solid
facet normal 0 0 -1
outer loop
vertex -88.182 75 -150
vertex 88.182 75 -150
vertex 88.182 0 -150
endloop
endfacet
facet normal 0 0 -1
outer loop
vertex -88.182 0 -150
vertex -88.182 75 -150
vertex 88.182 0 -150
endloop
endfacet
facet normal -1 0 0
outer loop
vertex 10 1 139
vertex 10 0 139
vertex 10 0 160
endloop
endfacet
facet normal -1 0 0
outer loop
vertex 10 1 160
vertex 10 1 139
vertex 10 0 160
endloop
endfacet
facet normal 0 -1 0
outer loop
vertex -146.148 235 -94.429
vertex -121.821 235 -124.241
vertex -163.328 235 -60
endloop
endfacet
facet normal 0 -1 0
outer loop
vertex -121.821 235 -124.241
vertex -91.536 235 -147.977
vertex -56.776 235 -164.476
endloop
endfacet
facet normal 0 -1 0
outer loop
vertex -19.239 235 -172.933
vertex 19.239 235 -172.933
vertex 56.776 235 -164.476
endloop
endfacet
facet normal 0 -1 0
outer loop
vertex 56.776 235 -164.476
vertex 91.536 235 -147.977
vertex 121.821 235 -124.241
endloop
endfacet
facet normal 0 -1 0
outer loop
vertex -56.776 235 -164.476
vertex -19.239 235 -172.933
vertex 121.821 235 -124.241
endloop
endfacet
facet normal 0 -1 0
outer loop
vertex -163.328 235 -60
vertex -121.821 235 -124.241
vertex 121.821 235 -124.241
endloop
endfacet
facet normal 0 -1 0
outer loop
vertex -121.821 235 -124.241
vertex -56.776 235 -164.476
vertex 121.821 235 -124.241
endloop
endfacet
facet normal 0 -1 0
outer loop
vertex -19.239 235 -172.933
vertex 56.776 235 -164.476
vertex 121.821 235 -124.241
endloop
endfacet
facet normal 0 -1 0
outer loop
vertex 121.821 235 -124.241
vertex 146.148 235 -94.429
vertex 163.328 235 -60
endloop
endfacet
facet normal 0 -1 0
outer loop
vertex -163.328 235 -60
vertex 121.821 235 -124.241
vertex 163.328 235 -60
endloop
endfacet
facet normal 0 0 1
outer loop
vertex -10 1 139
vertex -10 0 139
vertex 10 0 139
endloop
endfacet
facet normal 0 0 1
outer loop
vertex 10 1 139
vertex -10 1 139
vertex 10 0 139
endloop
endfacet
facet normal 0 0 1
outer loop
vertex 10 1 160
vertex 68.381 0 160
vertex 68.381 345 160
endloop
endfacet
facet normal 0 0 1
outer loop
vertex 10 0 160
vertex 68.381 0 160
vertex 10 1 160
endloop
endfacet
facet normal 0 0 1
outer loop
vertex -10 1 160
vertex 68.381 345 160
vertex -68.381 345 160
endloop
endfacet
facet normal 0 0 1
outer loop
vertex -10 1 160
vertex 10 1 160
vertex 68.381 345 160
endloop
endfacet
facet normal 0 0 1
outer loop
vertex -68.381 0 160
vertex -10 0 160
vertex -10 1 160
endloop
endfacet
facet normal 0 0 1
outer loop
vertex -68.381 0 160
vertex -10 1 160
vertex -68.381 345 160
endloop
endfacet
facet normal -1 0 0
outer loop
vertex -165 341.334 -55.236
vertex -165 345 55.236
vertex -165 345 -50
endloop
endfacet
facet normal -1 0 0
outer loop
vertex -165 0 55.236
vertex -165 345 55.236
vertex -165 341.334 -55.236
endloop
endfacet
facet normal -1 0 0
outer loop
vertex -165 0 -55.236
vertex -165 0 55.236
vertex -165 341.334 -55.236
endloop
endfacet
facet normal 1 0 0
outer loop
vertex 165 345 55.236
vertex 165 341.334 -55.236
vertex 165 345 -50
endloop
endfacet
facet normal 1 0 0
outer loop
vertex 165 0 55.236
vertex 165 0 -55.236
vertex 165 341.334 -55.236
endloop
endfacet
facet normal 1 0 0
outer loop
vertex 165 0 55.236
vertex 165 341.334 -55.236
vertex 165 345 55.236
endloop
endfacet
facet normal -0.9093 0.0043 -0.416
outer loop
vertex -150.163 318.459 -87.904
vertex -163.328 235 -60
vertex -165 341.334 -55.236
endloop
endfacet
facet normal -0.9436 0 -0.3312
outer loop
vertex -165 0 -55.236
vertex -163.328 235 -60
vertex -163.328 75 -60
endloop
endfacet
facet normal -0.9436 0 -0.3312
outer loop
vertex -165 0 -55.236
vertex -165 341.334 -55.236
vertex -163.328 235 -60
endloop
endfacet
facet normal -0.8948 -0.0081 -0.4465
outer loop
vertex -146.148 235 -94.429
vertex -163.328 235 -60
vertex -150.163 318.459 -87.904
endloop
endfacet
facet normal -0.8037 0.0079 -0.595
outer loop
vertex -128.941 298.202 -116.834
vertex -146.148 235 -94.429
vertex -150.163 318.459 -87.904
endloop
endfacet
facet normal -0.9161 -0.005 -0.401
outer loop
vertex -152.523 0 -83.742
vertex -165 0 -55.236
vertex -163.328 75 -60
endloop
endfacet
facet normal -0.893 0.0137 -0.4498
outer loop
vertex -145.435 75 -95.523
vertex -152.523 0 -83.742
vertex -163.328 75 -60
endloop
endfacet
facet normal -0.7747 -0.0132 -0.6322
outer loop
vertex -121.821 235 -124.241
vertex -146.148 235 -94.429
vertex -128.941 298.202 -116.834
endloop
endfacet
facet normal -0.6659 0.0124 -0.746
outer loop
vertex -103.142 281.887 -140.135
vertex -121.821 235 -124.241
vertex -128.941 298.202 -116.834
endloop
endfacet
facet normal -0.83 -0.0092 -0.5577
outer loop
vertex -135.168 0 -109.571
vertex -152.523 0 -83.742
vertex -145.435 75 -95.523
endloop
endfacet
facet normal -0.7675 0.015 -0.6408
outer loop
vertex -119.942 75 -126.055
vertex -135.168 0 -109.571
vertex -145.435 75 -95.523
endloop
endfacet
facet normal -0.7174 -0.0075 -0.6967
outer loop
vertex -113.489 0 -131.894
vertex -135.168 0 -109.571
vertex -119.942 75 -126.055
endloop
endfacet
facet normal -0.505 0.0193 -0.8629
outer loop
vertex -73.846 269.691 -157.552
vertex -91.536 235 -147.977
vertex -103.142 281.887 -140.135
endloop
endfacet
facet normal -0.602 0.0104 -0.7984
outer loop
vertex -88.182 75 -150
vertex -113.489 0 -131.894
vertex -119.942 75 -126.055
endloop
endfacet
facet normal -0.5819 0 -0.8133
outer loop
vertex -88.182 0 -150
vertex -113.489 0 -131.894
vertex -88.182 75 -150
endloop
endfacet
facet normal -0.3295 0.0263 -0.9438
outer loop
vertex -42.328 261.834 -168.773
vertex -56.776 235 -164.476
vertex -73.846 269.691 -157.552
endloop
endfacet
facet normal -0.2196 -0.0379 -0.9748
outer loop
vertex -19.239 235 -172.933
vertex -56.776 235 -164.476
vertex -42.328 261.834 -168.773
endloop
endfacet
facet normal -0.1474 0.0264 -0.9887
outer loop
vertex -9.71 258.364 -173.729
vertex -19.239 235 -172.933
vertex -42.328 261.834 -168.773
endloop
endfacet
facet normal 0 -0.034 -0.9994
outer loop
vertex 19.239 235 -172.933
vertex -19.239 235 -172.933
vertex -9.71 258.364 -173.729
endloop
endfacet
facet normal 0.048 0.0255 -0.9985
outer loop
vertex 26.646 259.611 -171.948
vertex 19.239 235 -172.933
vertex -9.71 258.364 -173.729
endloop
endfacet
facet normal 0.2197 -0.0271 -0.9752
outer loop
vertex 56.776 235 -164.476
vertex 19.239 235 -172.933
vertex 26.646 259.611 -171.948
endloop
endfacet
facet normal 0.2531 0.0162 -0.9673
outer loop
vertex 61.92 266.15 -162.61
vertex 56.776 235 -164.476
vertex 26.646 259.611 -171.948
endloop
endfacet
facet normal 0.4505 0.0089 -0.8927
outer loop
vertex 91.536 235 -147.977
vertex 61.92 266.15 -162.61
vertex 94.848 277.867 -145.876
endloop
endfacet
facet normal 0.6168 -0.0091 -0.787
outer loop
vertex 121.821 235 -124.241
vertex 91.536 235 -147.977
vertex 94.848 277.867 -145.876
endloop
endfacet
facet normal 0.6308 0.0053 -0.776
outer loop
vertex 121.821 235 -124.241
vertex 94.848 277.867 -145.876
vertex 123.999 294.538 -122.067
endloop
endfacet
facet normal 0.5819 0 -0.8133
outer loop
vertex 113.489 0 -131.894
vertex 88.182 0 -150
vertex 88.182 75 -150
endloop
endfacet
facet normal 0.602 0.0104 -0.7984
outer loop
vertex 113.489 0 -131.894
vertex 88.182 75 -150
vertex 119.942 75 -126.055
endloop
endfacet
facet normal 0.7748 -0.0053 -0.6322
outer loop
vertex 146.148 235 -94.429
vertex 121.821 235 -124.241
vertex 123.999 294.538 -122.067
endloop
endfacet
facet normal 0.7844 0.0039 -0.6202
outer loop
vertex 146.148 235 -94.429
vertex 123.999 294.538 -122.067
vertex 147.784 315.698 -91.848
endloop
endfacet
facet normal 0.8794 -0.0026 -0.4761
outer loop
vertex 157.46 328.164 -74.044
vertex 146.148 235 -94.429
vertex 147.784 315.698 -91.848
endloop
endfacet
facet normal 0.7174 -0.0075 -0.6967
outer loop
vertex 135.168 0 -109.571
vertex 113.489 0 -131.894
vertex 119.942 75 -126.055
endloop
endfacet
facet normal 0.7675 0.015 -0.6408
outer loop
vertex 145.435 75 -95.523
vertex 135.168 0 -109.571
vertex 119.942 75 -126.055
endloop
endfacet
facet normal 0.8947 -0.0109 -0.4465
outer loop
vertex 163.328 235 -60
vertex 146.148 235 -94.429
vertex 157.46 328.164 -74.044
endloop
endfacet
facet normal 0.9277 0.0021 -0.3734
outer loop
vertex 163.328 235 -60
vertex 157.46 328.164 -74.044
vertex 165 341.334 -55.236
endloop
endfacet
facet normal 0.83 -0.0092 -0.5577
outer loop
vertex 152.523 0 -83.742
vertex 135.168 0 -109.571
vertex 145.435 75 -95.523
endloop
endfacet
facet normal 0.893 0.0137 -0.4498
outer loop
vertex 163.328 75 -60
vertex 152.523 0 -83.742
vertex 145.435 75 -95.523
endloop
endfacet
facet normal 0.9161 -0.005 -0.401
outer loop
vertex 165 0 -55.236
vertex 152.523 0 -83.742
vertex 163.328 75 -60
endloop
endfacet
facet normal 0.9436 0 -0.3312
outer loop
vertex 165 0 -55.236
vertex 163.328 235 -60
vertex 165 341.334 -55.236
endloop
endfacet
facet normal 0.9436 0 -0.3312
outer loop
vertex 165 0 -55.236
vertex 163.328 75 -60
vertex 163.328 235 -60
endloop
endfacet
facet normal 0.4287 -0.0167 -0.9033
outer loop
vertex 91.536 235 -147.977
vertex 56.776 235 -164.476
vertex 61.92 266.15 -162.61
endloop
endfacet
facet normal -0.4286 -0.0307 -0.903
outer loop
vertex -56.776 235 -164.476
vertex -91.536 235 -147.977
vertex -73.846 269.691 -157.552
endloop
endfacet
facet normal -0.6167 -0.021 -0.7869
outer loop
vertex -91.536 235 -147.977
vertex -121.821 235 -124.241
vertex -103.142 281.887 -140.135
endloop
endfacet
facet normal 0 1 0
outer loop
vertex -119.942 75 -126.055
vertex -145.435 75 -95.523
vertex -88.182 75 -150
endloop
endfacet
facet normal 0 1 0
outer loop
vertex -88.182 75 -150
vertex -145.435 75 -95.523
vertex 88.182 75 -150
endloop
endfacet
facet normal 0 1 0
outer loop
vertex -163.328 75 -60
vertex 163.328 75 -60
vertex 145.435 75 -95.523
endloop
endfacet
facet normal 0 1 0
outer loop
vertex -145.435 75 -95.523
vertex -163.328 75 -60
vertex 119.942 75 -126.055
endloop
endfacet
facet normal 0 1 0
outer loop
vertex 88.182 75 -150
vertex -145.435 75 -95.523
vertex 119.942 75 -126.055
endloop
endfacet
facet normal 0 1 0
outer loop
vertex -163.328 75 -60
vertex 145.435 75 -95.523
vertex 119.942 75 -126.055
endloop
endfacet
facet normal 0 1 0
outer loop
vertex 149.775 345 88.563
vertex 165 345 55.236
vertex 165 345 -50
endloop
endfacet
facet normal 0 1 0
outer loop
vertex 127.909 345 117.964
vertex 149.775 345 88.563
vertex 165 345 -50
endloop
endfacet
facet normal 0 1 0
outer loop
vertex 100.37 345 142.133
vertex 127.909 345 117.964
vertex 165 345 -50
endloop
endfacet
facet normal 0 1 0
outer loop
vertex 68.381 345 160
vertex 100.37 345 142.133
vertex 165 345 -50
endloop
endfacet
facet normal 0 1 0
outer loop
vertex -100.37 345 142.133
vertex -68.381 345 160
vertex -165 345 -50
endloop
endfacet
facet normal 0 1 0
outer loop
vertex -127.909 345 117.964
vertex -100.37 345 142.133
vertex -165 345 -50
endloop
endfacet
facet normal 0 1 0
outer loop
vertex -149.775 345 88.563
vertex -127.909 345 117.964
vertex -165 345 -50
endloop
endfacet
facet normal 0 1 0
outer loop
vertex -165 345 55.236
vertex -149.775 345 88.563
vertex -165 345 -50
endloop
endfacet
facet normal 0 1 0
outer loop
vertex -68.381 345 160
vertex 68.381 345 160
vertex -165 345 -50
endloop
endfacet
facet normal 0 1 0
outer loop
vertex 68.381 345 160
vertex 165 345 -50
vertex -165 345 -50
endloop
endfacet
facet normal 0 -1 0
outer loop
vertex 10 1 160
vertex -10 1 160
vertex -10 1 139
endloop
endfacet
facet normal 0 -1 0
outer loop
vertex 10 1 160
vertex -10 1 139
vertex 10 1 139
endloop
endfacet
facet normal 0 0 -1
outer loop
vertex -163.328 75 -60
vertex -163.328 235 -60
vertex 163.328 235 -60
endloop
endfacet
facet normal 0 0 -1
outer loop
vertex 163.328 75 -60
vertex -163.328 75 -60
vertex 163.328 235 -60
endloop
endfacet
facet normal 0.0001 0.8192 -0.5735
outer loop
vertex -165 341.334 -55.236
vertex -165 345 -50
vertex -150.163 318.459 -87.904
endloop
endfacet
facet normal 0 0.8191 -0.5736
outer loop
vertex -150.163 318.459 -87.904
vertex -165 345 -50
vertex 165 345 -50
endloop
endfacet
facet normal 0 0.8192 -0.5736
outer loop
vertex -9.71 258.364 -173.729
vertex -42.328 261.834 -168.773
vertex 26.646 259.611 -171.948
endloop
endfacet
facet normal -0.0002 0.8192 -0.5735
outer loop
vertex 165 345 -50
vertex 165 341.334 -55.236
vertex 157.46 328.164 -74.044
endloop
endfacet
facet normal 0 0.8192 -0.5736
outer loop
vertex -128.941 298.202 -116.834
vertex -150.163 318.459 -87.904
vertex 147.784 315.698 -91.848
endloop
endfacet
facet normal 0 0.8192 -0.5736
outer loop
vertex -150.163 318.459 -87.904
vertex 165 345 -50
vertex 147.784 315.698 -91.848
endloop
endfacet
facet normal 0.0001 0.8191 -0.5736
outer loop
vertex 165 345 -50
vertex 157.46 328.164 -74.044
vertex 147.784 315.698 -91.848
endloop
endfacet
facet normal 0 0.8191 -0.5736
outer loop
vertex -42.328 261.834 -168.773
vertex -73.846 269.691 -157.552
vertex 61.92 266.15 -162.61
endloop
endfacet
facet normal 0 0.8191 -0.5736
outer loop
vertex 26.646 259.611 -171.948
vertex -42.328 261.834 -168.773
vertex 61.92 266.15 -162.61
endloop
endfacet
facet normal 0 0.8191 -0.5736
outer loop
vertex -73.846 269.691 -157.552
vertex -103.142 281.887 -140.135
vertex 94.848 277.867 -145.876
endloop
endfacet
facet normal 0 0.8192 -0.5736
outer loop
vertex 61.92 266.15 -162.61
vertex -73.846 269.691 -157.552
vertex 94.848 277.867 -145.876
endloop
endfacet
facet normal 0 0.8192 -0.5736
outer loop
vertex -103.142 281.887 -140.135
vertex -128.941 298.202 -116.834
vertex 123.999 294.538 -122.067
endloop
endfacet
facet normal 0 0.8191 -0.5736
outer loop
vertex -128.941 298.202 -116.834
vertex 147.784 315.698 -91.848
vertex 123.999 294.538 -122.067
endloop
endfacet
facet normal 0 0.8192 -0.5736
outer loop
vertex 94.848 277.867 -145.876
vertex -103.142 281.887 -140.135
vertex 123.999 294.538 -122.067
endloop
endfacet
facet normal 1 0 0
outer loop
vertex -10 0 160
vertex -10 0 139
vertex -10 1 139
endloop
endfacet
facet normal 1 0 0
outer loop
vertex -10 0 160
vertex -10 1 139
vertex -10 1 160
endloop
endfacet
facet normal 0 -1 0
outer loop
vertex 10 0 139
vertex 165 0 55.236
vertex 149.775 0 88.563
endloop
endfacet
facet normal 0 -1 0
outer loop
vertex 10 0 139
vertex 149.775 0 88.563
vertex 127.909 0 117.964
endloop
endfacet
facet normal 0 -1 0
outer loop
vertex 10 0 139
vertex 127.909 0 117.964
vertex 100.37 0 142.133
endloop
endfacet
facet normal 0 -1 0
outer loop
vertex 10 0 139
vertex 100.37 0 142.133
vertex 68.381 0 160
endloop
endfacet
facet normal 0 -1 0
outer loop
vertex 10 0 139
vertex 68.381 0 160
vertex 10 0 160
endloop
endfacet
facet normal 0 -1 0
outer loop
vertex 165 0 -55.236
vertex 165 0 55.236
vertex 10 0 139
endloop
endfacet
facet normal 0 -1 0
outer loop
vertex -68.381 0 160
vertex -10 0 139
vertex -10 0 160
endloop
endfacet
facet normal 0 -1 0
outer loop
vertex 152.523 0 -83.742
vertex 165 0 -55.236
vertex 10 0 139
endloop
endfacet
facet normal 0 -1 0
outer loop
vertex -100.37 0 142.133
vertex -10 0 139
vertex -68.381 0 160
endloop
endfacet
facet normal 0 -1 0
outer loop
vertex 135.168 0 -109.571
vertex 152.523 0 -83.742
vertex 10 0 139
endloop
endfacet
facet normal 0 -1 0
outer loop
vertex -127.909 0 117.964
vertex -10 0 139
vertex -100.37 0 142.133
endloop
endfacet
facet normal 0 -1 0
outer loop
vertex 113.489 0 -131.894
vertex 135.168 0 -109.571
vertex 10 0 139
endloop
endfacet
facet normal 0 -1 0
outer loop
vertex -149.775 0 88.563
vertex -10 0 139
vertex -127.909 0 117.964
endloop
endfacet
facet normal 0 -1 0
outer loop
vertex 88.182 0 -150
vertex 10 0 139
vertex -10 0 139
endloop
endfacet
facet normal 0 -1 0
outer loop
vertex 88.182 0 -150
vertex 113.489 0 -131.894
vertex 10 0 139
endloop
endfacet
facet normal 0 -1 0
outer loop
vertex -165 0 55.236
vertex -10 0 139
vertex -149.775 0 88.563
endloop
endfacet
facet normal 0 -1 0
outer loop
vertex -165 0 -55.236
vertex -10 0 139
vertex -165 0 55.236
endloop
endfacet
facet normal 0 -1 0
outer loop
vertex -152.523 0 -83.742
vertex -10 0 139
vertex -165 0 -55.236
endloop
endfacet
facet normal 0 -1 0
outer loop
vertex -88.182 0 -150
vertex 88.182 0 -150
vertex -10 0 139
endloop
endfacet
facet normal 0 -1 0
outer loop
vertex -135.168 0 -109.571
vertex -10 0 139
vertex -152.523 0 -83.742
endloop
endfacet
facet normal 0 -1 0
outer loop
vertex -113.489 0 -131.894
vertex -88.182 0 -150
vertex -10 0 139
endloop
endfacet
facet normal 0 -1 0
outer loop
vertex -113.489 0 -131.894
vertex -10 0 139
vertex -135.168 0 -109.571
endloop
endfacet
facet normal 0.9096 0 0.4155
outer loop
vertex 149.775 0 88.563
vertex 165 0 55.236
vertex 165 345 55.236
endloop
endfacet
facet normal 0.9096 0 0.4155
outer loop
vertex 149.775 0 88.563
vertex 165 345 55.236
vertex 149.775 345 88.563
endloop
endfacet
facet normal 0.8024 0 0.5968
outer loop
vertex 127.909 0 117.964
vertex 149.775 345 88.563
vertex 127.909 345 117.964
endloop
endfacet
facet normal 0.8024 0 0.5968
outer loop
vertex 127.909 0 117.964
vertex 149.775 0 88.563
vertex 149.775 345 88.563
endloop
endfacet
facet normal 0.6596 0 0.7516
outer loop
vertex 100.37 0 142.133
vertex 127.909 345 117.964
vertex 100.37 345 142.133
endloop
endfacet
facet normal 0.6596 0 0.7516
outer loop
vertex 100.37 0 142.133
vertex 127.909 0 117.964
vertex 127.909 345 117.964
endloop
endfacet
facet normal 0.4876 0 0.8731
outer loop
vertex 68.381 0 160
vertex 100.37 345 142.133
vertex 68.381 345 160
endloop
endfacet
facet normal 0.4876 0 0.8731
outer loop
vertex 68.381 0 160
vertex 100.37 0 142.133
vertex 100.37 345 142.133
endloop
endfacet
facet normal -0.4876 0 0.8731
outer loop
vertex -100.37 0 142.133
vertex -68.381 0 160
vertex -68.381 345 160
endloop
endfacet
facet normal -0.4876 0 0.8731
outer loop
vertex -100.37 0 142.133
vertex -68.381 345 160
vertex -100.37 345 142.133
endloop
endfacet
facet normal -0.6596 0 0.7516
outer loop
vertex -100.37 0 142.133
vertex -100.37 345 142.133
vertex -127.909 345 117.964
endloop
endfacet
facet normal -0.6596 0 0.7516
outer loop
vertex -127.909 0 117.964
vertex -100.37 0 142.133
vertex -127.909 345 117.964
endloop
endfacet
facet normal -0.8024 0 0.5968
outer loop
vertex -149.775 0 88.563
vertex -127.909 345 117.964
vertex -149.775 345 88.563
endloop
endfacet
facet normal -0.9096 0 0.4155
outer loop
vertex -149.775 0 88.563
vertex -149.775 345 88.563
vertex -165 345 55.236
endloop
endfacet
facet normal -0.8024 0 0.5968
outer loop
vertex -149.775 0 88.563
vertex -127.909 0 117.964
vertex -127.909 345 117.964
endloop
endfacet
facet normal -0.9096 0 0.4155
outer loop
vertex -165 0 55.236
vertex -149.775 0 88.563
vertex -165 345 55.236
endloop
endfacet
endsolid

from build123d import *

# Parameters (mm, degrees)
BOSS_EXTRU_1_DEPTH           = 345
ENL_V_MAT_EXTRU_1_DEPTH      = 421.149973224
ENL_V_MAT_EXTRU_1_DEPTH_BACK = 421.149973224
ESQUISSE5_W                  = 400
ESQUISSE5_H                  = 70
ENL_V_MAT_EXTRU_3_DEPTH      = 75
ESQUISSE6_W                  = 20
ESQUISSE6_H                  = 21
ENL_V_MAT_EXTRU_4_DEPTH      = 1


with BuildPart() as part:
    # Esquisse1 → Boss.-Extru.1 (new body)
    with BuildSketch(Plane(origin=(0, 0, 0), x_dir=(1, 0, 0), z_dir=(0, 1, 0))):
        with BuildLine():
            Line((-165, -55.235857919), (-165, 55.235857919))
            ThreePointArc((-165, 55.235857919), (0, 174), (165, 55.235857919))
            Line((165, 55.235857919), (165, -55.235857919))
            ThreePointArc((165, -55.235857919), (127.908511428, -117.963607542), (68.381283989, -160))
            Line((68.381283989, -160), (-68.381283989, -160))
            ThreePointArc((-68.381283989, -160), (-127.908511428, -117.963607542), (-165, -55.235857919))
        make_face()
    extrude(amount=BOSS_EXTRU_1_DEPTH)

    # Esquisse3 → Enlèv. mat.-Extru.1 (cut, two sides: drawn at the far end of the back side and taken through both)
    with BuildSketch(Plane.ZY.offset(-ENL_V_MAT_EXTRU_1_DEPTH_BACK)):
        Polygon((-50, 345), (-542.711062326, 0), (-542.711062326, 345), align=None)
        Polygon((-60, 150), (-130, 150), (-130, 75), (-150, 75), (-150, 0), (-174, 0), (-174, 235), (-60, 235), align=None)
    extrude(amount=ENL_V_MAT_EXTRU_1_DEPTH + ENL_V_MAT_EXTRU_1_DEPTH_BACK, mode=Mode.SUBTRACT)

    # Esquisse5 → Enlèv. mat.-Extru.3 (cut)
    with BuildSketch(Plane(origin=(0, 150, 0), x_dir=(1, 0, 0), z_dir=(0, 1, 0))):
        with Locations((0, 95)):
            Rectangle(ESQUISSE5_W, ESQUISSE5_H)
    extrude(amount=-ENL_V_MAT_EXTRU_3_DEPTH, mode=Mode.SUBTRACT)

    # Esquisse6 → Enlèv. mat.-Extru.4 (cut)
    with BuildSketch(Plane.XZ):
        with Locations((0, 149.5)):
            Rectangle(ESQUISSE6_W, ESQUISSE6_H)
    extrude(amount=-ENL_V_MAT_EXTRU_4_DEPTH, mode=Mode.SUBTRACT)


solid = part.part
